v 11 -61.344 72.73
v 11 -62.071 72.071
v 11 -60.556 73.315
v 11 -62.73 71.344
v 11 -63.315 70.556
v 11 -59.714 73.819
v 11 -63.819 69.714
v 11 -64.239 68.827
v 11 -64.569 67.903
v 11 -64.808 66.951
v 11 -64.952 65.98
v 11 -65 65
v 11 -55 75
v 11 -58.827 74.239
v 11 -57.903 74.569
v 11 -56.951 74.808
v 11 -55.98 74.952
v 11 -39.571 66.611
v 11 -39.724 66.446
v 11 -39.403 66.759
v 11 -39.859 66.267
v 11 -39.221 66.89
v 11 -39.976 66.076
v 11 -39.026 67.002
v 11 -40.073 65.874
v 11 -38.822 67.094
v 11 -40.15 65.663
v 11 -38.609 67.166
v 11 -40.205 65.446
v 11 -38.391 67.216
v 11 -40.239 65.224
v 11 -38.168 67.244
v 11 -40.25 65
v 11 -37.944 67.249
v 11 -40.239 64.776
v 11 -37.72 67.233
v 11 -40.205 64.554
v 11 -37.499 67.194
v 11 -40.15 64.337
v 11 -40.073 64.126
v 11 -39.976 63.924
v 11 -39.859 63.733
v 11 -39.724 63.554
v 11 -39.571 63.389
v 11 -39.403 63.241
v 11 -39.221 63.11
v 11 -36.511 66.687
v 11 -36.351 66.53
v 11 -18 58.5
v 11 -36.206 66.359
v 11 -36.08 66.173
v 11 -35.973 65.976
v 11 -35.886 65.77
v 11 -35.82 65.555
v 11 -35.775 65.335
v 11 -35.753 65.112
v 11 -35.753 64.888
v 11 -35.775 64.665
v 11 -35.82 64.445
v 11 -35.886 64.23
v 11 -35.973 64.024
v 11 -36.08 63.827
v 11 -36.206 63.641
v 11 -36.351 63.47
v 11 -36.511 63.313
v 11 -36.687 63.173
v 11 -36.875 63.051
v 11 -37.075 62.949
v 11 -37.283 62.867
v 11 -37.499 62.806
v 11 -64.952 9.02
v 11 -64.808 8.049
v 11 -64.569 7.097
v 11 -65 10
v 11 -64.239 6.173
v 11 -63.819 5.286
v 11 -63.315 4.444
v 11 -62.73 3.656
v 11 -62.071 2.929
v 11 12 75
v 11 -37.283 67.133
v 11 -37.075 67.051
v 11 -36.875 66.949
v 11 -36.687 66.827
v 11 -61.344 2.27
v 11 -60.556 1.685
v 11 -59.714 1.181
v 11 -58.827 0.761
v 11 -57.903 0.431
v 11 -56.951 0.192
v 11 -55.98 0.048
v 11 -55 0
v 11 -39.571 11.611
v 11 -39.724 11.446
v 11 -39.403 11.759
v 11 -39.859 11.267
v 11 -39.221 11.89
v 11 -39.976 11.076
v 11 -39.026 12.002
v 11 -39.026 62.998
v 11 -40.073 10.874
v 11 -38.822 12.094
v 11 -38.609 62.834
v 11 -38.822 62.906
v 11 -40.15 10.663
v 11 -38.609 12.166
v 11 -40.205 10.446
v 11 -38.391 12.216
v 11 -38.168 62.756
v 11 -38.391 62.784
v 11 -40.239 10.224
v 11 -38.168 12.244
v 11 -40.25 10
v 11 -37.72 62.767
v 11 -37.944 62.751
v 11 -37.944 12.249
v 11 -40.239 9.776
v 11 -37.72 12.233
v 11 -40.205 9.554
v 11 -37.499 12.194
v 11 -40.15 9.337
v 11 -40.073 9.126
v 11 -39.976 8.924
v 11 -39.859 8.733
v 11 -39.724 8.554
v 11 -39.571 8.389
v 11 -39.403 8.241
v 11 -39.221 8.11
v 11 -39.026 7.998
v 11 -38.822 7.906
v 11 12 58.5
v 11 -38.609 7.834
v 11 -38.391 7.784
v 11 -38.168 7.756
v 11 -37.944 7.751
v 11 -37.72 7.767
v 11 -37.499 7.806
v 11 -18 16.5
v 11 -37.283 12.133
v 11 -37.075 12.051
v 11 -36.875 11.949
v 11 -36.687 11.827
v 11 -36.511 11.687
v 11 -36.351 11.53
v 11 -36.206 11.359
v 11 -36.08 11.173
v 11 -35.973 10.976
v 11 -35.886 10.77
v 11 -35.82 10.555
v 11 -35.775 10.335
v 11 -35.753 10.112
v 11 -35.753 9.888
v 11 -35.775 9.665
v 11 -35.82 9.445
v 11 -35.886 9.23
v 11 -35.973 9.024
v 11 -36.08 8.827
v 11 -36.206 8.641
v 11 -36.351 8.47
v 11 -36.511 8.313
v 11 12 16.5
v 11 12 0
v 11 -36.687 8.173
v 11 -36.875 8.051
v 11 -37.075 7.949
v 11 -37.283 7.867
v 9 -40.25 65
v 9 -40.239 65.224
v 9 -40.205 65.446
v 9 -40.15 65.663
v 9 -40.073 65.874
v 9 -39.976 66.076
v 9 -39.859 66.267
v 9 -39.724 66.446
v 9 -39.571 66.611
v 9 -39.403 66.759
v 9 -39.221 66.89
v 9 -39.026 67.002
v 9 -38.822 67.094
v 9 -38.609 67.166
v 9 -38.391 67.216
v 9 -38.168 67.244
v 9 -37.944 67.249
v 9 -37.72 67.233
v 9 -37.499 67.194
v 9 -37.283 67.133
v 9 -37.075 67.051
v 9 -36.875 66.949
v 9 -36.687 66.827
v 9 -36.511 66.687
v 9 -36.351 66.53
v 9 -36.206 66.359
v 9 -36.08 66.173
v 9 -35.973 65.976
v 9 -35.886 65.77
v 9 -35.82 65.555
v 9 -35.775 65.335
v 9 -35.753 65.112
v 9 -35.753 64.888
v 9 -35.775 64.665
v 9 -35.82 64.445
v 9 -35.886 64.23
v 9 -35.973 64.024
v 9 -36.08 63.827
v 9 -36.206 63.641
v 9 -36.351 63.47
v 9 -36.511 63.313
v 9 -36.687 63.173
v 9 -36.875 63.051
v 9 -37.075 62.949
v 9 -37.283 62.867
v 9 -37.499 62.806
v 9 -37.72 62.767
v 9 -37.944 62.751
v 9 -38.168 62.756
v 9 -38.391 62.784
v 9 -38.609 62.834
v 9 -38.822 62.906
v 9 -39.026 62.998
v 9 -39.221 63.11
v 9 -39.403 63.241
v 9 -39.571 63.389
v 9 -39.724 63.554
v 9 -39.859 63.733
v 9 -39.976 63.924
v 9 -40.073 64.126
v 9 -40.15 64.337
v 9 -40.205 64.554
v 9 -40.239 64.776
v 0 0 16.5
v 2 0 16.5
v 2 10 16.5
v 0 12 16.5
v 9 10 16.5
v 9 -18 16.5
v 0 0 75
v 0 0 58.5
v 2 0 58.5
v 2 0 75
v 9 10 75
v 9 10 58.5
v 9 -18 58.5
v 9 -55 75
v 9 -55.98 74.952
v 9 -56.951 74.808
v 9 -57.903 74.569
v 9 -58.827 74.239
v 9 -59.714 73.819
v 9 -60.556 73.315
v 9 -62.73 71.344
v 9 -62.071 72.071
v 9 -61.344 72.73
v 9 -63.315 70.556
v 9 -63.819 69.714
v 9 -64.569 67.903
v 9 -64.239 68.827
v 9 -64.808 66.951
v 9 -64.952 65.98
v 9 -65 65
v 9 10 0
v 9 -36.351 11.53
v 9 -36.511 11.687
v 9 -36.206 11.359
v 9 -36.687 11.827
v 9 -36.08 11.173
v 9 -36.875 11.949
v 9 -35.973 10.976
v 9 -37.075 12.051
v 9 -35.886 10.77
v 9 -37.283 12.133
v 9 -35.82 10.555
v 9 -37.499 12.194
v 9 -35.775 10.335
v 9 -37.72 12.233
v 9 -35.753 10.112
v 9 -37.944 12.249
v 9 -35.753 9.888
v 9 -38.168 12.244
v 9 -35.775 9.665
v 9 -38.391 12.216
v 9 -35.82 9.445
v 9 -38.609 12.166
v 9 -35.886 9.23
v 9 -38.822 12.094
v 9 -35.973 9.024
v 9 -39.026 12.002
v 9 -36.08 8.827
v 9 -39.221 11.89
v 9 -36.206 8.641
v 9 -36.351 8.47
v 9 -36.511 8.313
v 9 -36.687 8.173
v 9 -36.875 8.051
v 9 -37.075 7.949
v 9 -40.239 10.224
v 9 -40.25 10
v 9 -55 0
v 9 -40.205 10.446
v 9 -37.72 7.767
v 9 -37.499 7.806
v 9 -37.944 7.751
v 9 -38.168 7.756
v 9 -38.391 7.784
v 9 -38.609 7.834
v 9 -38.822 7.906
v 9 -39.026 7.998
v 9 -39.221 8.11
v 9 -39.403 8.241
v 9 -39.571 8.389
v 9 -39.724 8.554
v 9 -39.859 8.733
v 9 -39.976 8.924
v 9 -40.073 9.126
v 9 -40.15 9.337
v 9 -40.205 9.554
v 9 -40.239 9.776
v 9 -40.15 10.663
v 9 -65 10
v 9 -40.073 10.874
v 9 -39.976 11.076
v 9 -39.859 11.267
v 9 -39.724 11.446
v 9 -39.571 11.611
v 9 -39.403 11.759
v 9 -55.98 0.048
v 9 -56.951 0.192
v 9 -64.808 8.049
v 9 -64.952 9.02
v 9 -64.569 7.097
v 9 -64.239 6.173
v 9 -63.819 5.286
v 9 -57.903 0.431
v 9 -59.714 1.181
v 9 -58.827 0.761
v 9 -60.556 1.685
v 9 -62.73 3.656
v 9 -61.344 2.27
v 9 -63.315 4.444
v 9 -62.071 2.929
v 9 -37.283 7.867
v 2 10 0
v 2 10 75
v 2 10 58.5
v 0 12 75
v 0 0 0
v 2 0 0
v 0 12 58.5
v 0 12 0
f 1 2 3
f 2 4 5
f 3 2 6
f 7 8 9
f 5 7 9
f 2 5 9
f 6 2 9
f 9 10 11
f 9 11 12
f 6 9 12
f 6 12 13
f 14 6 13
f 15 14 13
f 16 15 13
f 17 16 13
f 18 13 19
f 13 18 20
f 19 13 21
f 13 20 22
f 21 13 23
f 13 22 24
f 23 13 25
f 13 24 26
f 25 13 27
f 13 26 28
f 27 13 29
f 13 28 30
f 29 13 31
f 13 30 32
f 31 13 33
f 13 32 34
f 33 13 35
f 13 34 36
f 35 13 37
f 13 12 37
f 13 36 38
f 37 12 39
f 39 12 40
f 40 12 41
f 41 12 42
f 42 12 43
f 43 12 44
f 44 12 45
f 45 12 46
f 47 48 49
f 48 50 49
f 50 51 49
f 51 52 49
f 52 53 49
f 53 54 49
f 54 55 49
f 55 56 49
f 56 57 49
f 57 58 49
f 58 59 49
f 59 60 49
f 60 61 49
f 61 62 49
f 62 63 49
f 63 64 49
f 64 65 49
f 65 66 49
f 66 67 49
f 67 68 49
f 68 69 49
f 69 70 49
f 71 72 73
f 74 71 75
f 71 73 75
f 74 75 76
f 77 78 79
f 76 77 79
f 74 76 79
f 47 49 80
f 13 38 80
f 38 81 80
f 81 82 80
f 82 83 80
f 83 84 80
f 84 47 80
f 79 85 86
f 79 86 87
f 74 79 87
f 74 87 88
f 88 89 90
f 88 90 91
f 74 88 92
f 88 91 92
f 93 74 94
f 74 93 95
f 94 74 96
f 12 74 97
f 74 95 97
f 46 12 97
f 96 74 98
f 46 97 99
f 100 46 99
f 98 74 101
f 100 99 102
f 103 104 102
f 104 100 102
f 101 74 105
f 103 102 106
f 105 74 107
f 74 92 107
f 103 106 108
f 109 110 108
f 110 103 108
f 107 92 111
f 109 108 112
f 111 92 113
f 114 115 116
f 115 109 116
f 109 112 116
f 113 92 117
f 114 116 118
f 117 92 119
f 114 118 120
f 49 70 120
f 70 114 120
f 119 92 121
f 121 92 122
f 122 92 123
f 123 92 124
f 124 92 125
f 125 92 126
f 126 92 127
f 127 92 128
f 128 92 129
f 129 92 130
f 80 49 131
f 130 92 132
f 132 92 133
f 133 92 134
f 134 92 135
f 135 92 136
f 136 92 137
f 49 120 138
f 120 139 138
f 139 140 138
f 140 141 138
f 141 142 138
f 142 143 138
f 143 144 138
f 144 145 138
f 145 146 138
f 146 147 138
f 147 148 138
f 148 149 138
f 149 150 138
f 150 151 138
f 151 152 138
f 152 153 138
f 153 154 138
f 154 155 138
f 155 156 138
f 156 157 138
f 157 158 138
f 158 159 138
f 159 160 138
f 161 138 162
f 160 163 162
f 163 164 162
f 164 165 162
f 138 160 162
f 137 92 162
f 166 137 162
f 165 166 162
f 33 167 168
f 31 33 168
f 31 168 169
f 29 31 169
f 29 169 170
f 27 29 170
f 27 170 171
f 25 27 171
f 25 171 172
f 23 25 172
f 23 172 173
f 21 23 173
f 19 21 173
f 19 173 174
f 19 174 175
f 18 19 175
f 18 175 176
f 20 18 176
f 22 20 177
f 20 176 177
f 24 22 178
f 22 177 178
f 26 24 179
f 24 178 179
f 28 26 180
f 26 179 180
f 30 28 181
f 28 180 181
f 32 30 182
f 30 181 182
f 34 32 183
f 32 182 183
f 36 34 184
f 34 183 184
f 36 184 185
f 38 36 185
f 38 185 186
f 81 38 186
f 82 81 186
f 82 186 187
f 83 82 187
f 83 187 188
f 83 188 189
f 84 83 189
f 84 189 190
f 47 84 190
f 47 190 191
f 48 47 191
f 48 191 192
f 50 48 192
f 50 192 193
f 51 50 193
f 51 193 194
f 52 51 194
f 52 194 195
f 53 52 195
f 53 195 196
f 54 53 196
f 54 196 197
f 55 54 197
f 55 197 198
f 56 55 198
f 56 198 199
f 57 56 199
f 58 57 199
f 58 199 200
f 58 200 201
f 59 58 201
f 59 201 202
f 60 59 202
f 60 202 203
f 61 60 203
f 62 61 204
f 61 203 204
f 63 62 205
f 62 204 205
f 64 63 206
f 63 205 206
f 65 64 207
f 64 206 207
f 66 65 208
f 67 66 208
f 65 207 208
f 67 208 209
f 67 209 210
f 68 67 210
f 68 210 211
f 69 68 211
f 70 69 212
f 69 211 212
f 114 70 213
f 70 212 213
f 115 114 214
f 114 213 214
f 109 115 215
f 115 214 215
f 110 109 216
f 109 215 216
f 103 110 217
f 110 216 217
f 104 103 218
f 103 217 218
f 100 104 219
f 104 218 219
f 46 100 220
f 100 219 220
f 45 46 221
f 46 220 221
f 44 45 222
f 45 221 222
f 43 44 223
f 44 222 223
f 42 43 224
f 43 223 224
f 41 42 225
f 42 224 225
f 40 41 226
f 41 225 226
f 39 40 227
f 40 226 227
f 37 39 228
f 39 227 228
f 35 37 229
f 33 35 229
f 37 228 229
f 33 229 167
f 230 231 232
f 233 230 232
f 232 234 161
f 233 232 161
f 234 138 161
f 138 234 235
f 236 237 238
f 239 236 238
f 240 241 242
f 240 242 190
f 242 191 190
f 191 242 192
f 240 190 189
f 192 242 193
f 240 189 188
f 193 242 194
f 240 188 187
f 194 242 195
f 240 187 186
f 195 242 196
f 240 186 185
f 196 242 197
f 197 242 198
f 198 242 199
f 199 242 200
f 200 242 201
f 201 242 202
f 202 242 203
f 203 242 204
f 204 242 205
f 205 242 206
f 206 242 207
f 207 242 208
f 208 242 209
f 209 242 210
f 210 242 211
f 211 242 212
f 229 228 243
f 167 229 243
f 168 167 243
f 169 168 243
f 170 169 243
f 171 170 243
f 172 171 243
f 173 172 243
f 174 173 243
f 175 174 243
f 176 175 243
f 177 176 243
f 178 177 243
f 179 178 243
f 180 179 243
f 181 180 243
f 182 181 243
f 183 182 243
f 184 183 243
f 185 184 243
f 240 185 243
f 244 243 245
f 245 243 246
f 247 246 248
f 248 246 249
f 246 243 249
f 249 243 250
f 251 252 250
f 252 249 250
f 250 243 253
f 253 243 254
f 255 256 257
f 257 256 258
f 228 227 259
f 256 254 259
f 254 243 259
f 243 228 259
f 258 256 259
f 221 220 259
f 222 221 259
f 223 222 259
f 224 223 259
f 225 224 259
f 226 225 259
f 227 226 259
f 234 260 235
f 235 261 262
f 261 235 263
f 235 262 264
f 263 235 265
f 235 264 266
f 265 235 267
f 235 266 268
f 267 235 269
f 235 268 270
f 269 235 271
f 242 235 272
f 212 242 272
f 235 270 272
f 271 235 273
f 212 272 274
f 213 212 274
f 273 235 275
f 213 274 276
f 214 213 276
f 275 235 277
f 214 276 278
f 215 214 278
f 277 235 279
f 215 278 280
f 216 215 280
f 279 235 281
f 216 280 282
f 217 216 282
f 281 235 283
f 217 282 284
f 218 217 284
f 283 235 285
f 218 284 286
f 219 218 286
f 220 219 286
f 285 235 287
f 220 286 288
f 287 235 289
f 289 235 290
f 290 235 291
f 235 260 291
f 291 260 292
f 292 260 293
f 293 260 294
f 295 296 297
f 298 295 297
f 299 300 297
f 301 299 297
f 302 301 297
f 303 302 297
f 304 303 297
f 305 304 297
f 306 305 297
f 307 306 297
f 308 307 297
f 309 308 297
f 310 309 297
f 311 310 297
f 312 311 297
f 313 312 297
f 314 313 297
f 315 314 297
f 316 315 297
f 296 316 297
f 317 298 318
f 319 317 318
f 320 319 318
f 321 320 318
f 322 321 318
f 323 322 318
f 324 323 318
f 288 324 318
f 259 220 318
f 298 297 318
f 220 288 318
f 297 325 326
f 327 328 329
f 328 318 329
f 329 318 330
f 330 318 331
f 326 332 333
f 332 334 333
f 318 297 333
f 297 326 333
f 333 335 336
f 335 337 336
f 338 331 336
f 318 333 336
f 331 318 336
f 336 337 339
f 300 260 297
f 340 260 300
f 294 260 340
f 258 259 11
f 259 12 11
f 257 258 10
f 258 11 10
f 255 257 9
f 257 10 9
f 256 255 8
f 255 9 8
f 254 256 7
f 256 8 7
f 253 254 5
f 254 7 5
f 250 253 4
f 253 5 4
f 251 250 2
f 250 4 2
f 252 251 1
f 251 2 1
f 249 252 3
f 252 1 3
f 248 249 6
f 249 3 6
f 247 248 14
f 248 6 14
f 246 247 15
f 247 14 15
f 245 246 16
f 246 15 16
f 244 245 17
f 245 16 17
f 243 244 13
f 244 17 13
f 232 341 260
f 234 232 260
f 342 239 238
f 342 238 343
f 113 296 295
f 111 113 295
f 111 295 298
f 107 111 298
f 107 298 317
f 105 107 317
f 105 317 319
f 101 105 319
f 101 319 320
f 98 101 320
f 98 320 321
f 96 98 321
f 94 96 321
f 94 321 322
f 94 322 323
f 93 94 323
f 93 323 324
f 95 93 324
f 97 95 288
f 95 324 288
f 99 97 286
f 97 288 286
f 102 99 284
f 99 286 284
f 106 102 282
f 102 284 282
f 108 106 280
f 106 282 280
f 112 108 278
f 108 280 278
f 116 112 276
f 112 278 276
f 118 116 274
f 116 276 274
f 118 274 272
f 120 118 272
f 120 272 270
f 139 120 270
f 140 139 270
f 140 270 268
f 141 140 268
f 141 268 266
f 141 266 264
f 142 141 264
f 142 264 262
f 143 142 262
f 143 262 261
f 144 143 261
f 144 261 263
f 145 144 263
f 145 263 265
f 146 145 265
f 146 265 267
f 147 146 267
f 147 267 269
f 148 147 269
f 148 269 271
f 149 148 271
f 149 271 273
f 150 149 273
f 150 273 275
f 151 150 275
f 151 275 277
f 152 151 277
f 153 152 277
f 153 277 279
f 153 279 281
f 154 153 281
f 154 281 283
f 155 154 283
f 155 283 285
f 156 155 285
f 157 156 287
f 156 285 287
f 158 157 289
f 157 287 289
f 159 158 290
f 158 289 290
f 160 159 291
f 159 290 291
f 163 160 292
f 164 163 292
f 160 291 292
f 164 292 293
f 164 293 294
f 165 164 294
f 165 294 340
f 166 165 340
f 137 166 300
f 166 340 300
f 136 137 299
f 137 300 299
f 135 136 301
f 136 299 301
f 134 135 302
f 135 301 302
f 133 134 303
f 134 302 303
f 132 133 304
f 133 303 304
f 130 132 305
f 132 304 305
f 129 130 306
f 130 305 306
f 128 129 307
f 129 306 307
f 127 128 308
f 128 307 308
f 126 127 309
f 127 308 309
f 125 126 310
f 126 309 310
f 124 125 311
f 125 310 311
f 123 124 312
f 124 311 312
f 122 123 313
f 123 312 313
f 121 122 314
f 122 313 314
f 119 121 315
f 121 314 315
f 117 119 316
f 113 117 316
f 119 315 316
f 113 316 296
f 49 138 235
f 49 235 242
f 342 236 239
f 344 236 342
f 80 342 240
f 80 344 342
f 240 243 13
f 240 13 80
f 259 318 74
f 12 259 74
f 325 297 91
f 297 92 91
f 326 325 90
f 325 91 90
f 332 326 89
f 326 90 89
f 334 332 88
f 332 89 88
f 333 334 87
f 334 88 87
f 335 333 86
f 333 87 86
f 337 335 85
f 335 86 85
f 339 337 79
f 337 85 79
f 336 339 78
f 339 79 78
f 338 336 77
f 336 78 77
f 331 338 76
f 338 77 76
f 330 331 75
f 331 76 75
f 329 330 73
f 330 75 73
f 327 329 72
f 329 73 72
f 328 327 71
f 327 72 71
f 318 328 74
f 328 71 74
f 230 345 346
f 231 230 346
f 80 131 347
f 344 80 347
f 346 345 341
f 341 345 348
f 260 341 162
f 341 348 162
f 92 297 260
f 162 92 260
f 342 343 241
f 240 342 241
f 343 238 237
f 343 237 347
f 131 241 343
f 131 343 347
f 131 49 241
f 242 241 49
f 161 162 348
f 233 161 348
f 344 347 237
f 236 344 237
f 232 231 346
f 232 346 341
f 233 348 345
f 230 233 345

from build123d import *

# Parameters (mm, degrees)
F3_DEPTH = 75
F4_W     = 30
F4_H     = 42
F5_DEPTH = 25
F6_D     = 4.5
F7_R     = 10


with BuildPart() as f3:
    # F2 (on Top) → F3 (new body)
    with BuildSketch(Plane.XY):
        Polygon((0, 0), (2, 0), (2, 10), (9, 10), (9, -65), (11, -65), (11, 12), (0, 12), align=None)
    extrude(amount=F3_DEPTH)

    # F4 (on face) → F5 (cut)
    with BuildSketch(Plane.YZ.offset(11)):
        with Locations((-3, 37.5)):
            Rectangle(F4_W, F4_H)
    extrude(amount=-F5_DEPTH, mode=Mode.SUBTRACT)

    # F6 (through all)
    with Locations(Plane.YZ.offset(11)):
        with Locations((-38, 65), (-38, 10)):
            Hole(F6_D / 2)

    # F7
    f7_edges = [f3.edges().sort_by_distance(p)[0] for p in [
        (10, -65, 0),
        (10, -65, 75),
    ]]
    fillet(f7_edges, radius=F7_R)


solid = f3.part
